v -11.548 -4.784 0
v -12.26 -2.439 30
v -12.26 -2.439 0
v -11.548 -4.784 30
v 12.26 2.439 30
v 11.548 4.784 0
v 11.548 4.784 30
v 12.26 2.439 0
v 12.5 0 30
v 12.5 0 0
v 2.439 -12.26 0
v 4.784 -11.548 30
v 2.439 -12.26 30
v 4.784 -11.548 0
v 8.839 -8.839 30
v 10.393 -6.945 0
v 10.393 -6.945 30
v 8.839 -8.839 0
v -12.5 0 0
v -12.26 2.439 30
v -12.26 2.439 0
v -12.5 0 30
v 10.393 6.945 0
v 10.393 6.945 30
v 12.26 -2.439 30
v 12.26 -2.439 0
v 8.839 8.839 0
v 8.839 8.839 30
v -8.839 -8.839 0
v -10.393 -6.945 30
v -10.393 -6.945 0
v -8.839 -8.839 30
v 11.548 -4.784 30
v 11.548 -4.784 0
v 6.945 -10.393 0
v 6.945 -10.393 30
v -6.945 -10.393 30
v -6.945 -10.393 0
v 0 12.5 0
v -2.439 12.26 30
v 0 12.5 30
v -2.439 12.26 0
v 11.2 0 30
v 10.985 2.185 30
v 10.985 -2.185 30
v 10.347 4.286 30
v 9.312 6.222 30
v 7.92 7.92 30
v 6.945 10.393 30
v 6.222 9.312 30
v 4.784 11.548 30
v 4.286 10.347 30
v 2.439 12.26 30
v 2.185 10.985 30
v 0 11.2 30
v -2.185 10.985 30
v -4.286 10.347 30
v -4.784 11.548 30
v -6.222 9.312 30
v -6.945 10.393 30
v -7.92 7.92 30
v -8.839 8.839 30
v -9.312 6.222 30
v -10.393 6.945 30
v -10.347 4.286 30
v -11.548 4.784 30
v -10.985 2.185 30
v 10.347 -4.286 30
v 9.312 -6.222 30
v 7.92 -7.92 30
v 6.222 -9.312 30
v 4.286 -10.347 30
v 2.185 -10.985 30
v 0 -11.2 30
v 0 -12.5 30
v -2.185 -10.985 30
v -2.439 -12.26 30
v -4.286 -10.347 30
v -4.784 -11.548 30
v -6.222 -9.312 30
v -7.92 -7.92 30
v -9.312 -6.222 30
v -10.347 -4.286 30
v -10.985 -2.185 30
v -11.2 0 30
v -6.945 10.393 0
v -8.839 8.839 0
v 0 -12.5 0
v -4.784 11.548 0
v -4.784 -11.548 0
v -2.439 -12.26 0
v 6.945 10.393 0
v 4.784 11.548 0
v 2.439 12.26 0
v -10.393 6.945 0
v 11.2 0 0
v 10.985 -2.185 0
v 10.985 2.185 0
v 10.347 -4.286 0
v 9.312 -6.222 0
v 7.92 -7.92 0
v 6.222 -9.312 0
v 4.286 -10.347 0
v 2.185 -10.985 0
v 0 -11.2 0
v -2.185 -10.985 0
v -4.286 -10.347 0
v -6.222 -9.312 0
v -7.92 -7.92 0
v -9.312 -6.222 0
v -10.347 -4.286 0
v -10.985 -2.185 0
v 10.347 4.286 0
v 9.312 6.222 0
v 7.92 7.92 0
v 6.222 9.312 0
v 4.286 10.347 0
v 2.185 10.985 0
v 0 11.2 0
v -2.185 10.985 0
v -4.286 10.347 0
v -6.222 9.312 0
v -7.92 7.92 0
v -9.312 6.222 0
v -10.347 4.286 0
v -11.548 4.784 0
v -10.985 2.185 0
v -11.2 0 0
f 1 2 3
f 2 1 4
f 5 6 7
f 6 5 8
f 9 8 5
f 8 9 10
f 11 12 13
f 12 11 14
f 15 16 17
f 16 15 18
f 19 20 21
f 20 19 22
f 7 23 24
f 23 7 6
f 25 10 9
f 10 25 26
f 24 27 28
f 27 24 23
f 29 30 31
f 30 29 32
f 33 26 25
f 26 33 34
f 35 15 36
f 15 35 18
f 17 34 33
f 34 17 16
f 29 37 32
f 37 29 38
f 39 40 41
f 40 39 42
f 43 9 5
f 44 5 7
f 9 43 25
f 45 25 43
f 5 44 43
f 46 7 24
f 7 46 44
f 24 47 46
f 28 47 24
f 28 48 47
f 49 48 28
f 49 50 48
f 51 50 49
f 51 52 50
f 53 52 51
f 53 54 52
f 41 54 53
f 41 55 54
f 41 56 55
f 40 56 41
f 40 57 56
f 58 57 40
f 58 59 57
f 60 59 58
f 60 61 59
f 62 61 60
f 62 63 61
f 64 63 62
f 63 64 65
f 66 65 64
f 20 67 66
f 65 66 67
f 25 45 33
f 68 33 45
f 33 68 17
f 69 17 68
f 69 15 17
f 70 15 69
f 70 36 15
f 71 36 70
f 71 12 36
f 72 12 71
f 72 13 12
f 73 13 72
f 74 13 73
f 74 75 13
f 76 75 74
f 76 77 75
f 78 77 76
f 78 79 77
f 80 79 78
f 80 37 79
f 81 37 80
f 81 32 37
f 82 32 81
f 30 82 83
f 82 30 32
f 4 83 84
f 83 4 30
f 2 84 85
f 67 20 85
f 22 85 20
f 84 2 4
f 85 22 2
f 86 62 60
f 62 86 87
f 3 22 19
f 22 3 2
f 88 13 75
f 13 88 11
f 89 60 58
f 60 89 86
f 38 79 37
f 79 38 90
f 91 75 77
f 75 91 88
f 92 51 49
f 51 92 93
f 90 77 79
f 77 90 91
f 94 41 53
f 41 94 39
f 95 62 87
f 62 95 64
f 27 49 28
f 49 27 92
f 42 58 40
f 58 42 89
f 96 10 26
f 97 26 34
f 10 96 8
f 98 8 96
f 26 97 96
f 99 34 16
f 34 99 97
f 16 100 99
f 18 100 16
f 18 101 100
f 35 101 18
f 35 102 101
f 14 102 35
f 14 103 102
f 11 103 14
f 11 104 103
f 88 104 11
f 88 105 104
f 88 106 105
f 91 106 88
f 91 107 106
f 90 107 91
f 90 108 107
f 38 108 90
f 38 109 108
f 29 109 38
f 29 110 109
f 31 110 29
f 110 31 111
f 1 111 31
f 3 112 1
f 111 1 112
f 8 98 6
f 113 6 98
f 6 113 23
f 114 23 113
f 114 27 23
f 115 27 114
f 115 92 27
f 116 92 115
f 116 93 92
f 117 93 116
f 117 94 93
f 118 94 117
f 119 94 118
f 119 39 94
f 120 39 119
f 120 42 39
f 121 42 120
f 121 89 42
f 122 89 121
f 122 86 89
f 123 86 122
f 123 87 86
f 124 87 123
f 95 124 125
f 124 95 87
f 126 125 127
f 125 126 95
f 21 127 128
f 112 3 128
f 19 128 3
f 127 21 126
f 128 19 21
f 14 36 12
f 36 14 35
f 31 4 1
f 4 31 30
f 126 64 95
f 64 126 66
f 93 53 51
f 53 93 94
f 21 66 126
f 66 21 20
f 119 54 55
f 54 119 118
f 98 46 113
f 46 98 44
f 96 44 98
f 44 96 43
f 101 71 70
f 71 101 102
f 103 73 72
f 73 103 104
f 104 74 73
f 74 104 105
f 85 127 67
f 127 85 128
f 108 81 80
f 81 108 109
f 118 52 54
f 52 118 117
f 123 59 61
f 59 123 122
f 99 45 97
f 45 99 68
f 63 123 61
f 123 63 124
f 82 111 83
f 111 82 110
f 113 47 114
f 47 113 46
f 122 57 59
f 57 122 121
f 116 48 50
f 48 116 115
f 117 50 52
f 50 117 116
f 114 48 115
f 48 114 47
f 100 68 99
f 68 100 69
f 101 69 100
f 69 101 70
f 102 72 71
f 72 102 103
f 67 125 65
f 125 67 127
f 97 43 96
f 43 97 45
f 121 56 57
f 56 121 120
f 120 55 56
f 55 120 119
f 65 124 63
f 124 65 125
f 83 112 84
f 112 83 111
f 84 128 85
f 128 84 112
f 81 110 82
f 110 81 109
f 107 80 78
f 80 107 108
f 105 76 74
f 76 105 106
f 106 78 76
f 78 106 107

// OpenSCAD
$fn = 32;

// ----------------------------------------------------------------------
// Thin tube: 1.3 mm wall
// ----------------------------------------------------------------------

// --- parameters (mm) ---
tube_od = 25;             // outer diameter
tube_h = 30;              // height, Z
wall = 1.3;               // wall thickness

difference() {
  cylinder(h = tube_h, d = tube_od);
  translate([0, 0, -1]) cylinder(h = tube_h + 2, d = tube_od - 2 * wall);
}
